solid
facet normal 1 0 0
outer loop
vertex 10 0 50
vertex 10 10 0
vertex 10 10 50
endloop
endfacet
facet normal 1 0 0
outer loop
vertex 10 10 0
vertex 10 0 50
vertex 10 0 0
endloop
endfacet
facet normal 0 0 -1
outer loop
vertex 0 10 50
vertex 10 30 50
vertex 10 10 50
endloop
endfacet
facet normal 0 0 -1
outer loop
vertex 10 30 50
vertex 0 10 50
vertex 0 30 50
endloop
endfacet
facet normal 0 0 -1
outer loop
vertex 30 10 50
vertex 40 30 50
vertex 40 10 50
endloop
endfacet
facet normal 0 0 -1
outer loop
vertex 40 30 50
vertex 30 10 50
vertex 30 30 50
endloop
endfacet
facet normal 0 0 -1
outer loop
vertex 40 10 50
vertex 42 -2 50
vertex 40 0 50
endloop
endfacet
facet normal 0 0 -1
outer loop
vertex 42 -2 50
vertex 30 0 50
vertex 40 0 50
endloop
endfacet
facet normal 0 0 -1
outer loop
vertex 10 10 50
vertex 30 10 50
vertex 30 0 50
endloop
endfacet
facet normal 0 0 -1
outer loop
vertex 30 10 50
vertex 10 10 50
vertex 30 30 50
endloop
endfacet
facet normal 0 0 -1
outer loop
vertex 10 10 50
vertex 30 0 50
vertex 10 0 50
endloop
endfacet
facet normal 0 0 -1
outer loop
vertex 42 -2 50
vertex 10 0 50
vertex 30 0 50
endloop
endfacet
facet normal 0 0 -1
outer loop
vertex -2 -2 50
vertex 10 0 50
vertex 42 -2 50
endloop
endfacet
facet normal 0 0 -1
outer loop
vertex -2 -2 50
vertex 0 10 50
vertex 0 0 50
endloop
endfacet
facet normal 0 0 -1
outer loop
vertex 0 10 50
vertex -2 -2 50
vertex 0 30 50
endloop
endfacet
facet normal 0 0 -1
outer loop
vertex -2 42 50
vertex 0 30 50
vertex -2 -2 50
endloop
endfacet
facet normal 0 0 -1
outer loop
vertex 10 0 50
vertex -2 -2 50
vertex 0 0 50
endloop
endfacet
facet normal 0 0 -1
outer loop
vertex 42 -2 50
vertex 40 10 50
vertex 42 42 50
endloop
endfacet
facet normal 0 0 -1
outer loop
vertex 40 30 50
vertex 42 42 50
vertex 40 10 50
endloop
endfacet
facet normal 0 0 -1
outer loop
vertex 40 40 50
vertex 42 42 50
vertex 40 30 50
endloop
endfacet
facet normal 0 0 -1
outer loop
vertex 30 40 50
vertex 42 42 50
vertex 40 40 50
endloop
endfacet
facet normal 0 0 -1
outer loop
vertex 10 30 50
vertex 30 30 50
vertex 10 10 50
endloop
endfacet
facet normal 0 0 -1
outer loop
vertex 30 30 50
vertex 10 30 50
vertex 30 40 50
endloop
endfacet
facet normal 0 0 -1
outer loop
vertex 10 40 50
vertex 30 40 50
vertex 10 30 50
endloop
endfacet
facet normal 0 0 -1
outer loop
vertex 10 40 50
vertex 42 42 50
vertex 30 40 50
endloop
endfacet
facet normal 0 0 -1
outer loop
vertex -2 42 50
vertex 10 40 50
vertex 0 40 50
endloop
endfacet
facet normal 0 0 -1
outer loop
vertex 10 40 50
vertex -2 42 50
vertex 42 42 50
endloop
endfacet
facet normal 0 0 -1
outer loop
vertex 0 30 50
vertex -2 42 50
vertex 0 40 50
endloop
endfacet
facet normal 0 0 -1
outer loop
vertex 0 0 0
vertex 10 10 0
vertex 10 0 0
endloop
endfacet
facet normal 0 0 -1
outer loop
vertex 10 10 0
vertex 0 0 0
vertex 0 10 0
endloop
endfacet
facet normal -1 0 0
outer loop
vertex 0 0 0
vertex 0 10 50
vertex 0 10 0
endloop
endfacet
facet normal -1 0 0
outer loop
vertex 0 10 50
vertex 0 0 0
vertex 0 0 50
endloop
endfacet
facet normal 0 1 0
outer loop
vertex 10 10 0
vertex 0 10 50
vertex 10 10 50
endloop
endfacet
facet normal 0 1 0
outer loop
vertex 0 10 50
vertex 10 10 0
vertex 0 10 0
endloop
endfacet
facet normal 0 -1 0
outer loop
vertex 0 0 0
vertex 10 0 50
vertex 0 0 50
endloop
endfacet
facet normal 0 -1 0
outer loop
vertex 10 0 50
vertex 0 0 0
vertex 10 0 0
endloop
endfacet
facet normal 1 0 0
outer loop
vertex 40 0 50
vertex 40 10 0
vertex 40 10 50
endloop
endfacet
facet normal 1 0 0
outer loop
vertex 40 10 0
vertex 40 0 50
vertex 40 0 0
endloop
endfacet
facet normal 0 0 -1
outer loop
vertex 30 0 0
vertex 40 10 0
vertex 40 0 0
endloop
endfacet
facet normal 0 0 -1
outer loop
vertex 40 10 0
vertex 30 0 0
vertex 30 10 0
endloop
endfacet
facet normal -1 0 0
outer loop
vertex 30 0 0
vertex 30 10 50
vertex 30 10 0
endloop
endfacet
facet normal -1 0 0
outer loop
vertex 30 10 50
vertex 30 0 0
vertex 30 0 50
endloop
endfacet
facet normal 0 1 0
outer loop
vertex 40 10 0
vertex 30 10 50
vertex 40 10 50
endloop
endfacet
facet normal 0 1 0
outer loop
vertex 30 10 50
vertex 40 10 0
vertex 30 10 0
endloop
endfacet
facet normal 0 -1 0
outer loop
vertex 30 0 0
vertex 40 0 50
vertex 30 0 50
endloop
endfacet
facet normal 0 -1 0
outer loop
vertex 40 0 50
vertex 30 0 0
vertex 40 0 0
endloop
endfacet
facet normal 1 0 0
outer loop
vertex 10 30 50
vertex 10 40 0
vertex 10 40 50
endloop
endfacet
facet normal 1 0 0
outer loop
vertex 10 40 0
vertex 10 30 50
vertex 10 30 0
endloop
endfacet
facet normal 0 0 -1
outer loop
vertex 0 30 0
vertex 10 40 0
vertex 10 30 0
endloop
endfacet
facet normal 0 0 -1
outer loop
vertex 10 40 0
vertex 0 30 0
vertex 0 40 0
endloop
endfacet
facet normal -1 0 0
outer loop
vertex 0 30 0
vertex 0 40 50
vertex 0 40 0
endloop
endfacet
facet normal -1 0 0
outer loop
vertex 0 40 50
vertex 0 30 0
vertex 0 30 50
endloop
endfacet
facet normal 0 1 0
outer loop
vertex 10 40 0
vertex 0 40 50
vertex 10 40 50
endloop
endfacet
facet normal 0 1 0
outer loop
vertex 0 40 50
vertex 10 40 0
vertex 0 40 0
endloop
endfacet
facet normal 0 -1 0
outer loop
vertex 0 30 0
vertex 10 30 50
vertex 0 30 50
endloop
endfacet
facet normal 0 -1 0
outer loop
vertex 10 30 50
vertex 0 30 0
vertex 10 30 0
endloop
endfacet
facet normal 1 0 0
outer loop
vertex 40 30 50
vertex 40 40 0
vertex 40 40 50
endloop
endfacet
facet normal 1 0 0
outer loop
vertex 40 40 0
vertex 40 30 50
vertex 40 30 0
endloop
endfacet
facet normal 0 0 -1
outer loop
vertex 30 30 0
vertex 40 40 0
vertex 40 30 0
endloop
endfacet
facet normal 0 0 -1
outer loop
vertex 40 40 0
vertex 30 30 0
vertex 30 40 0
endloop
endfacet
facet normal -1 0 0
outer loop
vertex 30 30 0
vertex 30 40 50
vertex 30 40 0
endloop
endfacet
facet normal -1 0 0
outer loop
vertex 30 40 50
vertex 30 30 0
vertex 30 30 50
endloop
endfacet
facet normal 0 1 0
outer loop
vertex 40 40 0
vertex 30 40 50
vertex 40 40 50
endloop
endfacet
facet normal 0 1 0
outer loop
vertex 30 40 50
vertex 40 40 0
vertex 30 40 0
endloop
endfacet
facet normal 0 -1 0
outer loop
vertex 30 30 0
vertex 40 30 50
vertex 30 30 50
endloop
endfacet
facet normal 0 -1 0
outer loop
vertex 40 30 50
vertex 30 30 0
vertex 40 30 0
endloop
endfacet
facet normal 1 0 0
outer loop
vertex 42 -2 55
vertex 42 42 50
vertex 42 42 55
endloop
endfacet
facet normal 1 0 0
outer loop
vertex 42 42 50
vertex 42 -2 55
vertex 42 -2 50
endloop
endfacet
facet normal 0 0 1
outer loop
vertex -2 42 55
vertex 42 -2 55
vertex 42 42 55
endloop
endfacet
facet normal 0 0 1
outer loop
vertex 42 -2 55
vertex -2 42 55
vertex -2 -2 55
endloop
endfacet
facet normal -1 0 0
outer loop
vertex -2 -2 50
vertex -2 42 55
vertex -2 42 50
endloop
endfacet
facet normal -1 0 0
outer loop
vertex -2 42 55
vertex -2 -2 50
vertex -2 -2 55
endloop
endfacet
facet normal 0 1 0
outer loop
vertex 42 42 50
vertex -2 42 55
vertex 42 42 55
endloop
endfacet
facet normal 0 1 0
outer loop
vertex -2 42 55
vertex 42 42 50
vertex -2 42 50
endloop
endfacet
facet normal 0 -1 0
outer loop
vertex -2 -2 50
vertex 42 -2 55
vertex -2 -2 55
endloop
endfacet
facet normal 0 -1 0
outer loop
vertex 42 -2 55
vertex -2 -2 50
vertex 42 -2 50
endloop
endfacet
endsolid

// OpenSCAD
pied_ep = 10;
pied_ht = 50;

table_lg = 40;
table_ep = 5;
table_rebord = 2;

union()
{
    cube([pied_ep, pied_ep, pied_ht]);
    
    translate([table_lg-pied_ep,0,0])
    cube([pied_ep, pied_ep, pied_ht]);
    
    translate([0,table_lg-pied_ep,0])
    cube([pied_ep, pied_ep, pied_ht]);
    
    translate([table_lg-pied_ep,table_lg-pied_ep,0])
    cube([pied_ep, pied_ep, pied_ht]);
    
    translate([-table_rebord, -table_rebord, pied_ht])
    cube([table_lg+2*table_rebord, table_lg+2*table_rebord,table_ep]);
}
